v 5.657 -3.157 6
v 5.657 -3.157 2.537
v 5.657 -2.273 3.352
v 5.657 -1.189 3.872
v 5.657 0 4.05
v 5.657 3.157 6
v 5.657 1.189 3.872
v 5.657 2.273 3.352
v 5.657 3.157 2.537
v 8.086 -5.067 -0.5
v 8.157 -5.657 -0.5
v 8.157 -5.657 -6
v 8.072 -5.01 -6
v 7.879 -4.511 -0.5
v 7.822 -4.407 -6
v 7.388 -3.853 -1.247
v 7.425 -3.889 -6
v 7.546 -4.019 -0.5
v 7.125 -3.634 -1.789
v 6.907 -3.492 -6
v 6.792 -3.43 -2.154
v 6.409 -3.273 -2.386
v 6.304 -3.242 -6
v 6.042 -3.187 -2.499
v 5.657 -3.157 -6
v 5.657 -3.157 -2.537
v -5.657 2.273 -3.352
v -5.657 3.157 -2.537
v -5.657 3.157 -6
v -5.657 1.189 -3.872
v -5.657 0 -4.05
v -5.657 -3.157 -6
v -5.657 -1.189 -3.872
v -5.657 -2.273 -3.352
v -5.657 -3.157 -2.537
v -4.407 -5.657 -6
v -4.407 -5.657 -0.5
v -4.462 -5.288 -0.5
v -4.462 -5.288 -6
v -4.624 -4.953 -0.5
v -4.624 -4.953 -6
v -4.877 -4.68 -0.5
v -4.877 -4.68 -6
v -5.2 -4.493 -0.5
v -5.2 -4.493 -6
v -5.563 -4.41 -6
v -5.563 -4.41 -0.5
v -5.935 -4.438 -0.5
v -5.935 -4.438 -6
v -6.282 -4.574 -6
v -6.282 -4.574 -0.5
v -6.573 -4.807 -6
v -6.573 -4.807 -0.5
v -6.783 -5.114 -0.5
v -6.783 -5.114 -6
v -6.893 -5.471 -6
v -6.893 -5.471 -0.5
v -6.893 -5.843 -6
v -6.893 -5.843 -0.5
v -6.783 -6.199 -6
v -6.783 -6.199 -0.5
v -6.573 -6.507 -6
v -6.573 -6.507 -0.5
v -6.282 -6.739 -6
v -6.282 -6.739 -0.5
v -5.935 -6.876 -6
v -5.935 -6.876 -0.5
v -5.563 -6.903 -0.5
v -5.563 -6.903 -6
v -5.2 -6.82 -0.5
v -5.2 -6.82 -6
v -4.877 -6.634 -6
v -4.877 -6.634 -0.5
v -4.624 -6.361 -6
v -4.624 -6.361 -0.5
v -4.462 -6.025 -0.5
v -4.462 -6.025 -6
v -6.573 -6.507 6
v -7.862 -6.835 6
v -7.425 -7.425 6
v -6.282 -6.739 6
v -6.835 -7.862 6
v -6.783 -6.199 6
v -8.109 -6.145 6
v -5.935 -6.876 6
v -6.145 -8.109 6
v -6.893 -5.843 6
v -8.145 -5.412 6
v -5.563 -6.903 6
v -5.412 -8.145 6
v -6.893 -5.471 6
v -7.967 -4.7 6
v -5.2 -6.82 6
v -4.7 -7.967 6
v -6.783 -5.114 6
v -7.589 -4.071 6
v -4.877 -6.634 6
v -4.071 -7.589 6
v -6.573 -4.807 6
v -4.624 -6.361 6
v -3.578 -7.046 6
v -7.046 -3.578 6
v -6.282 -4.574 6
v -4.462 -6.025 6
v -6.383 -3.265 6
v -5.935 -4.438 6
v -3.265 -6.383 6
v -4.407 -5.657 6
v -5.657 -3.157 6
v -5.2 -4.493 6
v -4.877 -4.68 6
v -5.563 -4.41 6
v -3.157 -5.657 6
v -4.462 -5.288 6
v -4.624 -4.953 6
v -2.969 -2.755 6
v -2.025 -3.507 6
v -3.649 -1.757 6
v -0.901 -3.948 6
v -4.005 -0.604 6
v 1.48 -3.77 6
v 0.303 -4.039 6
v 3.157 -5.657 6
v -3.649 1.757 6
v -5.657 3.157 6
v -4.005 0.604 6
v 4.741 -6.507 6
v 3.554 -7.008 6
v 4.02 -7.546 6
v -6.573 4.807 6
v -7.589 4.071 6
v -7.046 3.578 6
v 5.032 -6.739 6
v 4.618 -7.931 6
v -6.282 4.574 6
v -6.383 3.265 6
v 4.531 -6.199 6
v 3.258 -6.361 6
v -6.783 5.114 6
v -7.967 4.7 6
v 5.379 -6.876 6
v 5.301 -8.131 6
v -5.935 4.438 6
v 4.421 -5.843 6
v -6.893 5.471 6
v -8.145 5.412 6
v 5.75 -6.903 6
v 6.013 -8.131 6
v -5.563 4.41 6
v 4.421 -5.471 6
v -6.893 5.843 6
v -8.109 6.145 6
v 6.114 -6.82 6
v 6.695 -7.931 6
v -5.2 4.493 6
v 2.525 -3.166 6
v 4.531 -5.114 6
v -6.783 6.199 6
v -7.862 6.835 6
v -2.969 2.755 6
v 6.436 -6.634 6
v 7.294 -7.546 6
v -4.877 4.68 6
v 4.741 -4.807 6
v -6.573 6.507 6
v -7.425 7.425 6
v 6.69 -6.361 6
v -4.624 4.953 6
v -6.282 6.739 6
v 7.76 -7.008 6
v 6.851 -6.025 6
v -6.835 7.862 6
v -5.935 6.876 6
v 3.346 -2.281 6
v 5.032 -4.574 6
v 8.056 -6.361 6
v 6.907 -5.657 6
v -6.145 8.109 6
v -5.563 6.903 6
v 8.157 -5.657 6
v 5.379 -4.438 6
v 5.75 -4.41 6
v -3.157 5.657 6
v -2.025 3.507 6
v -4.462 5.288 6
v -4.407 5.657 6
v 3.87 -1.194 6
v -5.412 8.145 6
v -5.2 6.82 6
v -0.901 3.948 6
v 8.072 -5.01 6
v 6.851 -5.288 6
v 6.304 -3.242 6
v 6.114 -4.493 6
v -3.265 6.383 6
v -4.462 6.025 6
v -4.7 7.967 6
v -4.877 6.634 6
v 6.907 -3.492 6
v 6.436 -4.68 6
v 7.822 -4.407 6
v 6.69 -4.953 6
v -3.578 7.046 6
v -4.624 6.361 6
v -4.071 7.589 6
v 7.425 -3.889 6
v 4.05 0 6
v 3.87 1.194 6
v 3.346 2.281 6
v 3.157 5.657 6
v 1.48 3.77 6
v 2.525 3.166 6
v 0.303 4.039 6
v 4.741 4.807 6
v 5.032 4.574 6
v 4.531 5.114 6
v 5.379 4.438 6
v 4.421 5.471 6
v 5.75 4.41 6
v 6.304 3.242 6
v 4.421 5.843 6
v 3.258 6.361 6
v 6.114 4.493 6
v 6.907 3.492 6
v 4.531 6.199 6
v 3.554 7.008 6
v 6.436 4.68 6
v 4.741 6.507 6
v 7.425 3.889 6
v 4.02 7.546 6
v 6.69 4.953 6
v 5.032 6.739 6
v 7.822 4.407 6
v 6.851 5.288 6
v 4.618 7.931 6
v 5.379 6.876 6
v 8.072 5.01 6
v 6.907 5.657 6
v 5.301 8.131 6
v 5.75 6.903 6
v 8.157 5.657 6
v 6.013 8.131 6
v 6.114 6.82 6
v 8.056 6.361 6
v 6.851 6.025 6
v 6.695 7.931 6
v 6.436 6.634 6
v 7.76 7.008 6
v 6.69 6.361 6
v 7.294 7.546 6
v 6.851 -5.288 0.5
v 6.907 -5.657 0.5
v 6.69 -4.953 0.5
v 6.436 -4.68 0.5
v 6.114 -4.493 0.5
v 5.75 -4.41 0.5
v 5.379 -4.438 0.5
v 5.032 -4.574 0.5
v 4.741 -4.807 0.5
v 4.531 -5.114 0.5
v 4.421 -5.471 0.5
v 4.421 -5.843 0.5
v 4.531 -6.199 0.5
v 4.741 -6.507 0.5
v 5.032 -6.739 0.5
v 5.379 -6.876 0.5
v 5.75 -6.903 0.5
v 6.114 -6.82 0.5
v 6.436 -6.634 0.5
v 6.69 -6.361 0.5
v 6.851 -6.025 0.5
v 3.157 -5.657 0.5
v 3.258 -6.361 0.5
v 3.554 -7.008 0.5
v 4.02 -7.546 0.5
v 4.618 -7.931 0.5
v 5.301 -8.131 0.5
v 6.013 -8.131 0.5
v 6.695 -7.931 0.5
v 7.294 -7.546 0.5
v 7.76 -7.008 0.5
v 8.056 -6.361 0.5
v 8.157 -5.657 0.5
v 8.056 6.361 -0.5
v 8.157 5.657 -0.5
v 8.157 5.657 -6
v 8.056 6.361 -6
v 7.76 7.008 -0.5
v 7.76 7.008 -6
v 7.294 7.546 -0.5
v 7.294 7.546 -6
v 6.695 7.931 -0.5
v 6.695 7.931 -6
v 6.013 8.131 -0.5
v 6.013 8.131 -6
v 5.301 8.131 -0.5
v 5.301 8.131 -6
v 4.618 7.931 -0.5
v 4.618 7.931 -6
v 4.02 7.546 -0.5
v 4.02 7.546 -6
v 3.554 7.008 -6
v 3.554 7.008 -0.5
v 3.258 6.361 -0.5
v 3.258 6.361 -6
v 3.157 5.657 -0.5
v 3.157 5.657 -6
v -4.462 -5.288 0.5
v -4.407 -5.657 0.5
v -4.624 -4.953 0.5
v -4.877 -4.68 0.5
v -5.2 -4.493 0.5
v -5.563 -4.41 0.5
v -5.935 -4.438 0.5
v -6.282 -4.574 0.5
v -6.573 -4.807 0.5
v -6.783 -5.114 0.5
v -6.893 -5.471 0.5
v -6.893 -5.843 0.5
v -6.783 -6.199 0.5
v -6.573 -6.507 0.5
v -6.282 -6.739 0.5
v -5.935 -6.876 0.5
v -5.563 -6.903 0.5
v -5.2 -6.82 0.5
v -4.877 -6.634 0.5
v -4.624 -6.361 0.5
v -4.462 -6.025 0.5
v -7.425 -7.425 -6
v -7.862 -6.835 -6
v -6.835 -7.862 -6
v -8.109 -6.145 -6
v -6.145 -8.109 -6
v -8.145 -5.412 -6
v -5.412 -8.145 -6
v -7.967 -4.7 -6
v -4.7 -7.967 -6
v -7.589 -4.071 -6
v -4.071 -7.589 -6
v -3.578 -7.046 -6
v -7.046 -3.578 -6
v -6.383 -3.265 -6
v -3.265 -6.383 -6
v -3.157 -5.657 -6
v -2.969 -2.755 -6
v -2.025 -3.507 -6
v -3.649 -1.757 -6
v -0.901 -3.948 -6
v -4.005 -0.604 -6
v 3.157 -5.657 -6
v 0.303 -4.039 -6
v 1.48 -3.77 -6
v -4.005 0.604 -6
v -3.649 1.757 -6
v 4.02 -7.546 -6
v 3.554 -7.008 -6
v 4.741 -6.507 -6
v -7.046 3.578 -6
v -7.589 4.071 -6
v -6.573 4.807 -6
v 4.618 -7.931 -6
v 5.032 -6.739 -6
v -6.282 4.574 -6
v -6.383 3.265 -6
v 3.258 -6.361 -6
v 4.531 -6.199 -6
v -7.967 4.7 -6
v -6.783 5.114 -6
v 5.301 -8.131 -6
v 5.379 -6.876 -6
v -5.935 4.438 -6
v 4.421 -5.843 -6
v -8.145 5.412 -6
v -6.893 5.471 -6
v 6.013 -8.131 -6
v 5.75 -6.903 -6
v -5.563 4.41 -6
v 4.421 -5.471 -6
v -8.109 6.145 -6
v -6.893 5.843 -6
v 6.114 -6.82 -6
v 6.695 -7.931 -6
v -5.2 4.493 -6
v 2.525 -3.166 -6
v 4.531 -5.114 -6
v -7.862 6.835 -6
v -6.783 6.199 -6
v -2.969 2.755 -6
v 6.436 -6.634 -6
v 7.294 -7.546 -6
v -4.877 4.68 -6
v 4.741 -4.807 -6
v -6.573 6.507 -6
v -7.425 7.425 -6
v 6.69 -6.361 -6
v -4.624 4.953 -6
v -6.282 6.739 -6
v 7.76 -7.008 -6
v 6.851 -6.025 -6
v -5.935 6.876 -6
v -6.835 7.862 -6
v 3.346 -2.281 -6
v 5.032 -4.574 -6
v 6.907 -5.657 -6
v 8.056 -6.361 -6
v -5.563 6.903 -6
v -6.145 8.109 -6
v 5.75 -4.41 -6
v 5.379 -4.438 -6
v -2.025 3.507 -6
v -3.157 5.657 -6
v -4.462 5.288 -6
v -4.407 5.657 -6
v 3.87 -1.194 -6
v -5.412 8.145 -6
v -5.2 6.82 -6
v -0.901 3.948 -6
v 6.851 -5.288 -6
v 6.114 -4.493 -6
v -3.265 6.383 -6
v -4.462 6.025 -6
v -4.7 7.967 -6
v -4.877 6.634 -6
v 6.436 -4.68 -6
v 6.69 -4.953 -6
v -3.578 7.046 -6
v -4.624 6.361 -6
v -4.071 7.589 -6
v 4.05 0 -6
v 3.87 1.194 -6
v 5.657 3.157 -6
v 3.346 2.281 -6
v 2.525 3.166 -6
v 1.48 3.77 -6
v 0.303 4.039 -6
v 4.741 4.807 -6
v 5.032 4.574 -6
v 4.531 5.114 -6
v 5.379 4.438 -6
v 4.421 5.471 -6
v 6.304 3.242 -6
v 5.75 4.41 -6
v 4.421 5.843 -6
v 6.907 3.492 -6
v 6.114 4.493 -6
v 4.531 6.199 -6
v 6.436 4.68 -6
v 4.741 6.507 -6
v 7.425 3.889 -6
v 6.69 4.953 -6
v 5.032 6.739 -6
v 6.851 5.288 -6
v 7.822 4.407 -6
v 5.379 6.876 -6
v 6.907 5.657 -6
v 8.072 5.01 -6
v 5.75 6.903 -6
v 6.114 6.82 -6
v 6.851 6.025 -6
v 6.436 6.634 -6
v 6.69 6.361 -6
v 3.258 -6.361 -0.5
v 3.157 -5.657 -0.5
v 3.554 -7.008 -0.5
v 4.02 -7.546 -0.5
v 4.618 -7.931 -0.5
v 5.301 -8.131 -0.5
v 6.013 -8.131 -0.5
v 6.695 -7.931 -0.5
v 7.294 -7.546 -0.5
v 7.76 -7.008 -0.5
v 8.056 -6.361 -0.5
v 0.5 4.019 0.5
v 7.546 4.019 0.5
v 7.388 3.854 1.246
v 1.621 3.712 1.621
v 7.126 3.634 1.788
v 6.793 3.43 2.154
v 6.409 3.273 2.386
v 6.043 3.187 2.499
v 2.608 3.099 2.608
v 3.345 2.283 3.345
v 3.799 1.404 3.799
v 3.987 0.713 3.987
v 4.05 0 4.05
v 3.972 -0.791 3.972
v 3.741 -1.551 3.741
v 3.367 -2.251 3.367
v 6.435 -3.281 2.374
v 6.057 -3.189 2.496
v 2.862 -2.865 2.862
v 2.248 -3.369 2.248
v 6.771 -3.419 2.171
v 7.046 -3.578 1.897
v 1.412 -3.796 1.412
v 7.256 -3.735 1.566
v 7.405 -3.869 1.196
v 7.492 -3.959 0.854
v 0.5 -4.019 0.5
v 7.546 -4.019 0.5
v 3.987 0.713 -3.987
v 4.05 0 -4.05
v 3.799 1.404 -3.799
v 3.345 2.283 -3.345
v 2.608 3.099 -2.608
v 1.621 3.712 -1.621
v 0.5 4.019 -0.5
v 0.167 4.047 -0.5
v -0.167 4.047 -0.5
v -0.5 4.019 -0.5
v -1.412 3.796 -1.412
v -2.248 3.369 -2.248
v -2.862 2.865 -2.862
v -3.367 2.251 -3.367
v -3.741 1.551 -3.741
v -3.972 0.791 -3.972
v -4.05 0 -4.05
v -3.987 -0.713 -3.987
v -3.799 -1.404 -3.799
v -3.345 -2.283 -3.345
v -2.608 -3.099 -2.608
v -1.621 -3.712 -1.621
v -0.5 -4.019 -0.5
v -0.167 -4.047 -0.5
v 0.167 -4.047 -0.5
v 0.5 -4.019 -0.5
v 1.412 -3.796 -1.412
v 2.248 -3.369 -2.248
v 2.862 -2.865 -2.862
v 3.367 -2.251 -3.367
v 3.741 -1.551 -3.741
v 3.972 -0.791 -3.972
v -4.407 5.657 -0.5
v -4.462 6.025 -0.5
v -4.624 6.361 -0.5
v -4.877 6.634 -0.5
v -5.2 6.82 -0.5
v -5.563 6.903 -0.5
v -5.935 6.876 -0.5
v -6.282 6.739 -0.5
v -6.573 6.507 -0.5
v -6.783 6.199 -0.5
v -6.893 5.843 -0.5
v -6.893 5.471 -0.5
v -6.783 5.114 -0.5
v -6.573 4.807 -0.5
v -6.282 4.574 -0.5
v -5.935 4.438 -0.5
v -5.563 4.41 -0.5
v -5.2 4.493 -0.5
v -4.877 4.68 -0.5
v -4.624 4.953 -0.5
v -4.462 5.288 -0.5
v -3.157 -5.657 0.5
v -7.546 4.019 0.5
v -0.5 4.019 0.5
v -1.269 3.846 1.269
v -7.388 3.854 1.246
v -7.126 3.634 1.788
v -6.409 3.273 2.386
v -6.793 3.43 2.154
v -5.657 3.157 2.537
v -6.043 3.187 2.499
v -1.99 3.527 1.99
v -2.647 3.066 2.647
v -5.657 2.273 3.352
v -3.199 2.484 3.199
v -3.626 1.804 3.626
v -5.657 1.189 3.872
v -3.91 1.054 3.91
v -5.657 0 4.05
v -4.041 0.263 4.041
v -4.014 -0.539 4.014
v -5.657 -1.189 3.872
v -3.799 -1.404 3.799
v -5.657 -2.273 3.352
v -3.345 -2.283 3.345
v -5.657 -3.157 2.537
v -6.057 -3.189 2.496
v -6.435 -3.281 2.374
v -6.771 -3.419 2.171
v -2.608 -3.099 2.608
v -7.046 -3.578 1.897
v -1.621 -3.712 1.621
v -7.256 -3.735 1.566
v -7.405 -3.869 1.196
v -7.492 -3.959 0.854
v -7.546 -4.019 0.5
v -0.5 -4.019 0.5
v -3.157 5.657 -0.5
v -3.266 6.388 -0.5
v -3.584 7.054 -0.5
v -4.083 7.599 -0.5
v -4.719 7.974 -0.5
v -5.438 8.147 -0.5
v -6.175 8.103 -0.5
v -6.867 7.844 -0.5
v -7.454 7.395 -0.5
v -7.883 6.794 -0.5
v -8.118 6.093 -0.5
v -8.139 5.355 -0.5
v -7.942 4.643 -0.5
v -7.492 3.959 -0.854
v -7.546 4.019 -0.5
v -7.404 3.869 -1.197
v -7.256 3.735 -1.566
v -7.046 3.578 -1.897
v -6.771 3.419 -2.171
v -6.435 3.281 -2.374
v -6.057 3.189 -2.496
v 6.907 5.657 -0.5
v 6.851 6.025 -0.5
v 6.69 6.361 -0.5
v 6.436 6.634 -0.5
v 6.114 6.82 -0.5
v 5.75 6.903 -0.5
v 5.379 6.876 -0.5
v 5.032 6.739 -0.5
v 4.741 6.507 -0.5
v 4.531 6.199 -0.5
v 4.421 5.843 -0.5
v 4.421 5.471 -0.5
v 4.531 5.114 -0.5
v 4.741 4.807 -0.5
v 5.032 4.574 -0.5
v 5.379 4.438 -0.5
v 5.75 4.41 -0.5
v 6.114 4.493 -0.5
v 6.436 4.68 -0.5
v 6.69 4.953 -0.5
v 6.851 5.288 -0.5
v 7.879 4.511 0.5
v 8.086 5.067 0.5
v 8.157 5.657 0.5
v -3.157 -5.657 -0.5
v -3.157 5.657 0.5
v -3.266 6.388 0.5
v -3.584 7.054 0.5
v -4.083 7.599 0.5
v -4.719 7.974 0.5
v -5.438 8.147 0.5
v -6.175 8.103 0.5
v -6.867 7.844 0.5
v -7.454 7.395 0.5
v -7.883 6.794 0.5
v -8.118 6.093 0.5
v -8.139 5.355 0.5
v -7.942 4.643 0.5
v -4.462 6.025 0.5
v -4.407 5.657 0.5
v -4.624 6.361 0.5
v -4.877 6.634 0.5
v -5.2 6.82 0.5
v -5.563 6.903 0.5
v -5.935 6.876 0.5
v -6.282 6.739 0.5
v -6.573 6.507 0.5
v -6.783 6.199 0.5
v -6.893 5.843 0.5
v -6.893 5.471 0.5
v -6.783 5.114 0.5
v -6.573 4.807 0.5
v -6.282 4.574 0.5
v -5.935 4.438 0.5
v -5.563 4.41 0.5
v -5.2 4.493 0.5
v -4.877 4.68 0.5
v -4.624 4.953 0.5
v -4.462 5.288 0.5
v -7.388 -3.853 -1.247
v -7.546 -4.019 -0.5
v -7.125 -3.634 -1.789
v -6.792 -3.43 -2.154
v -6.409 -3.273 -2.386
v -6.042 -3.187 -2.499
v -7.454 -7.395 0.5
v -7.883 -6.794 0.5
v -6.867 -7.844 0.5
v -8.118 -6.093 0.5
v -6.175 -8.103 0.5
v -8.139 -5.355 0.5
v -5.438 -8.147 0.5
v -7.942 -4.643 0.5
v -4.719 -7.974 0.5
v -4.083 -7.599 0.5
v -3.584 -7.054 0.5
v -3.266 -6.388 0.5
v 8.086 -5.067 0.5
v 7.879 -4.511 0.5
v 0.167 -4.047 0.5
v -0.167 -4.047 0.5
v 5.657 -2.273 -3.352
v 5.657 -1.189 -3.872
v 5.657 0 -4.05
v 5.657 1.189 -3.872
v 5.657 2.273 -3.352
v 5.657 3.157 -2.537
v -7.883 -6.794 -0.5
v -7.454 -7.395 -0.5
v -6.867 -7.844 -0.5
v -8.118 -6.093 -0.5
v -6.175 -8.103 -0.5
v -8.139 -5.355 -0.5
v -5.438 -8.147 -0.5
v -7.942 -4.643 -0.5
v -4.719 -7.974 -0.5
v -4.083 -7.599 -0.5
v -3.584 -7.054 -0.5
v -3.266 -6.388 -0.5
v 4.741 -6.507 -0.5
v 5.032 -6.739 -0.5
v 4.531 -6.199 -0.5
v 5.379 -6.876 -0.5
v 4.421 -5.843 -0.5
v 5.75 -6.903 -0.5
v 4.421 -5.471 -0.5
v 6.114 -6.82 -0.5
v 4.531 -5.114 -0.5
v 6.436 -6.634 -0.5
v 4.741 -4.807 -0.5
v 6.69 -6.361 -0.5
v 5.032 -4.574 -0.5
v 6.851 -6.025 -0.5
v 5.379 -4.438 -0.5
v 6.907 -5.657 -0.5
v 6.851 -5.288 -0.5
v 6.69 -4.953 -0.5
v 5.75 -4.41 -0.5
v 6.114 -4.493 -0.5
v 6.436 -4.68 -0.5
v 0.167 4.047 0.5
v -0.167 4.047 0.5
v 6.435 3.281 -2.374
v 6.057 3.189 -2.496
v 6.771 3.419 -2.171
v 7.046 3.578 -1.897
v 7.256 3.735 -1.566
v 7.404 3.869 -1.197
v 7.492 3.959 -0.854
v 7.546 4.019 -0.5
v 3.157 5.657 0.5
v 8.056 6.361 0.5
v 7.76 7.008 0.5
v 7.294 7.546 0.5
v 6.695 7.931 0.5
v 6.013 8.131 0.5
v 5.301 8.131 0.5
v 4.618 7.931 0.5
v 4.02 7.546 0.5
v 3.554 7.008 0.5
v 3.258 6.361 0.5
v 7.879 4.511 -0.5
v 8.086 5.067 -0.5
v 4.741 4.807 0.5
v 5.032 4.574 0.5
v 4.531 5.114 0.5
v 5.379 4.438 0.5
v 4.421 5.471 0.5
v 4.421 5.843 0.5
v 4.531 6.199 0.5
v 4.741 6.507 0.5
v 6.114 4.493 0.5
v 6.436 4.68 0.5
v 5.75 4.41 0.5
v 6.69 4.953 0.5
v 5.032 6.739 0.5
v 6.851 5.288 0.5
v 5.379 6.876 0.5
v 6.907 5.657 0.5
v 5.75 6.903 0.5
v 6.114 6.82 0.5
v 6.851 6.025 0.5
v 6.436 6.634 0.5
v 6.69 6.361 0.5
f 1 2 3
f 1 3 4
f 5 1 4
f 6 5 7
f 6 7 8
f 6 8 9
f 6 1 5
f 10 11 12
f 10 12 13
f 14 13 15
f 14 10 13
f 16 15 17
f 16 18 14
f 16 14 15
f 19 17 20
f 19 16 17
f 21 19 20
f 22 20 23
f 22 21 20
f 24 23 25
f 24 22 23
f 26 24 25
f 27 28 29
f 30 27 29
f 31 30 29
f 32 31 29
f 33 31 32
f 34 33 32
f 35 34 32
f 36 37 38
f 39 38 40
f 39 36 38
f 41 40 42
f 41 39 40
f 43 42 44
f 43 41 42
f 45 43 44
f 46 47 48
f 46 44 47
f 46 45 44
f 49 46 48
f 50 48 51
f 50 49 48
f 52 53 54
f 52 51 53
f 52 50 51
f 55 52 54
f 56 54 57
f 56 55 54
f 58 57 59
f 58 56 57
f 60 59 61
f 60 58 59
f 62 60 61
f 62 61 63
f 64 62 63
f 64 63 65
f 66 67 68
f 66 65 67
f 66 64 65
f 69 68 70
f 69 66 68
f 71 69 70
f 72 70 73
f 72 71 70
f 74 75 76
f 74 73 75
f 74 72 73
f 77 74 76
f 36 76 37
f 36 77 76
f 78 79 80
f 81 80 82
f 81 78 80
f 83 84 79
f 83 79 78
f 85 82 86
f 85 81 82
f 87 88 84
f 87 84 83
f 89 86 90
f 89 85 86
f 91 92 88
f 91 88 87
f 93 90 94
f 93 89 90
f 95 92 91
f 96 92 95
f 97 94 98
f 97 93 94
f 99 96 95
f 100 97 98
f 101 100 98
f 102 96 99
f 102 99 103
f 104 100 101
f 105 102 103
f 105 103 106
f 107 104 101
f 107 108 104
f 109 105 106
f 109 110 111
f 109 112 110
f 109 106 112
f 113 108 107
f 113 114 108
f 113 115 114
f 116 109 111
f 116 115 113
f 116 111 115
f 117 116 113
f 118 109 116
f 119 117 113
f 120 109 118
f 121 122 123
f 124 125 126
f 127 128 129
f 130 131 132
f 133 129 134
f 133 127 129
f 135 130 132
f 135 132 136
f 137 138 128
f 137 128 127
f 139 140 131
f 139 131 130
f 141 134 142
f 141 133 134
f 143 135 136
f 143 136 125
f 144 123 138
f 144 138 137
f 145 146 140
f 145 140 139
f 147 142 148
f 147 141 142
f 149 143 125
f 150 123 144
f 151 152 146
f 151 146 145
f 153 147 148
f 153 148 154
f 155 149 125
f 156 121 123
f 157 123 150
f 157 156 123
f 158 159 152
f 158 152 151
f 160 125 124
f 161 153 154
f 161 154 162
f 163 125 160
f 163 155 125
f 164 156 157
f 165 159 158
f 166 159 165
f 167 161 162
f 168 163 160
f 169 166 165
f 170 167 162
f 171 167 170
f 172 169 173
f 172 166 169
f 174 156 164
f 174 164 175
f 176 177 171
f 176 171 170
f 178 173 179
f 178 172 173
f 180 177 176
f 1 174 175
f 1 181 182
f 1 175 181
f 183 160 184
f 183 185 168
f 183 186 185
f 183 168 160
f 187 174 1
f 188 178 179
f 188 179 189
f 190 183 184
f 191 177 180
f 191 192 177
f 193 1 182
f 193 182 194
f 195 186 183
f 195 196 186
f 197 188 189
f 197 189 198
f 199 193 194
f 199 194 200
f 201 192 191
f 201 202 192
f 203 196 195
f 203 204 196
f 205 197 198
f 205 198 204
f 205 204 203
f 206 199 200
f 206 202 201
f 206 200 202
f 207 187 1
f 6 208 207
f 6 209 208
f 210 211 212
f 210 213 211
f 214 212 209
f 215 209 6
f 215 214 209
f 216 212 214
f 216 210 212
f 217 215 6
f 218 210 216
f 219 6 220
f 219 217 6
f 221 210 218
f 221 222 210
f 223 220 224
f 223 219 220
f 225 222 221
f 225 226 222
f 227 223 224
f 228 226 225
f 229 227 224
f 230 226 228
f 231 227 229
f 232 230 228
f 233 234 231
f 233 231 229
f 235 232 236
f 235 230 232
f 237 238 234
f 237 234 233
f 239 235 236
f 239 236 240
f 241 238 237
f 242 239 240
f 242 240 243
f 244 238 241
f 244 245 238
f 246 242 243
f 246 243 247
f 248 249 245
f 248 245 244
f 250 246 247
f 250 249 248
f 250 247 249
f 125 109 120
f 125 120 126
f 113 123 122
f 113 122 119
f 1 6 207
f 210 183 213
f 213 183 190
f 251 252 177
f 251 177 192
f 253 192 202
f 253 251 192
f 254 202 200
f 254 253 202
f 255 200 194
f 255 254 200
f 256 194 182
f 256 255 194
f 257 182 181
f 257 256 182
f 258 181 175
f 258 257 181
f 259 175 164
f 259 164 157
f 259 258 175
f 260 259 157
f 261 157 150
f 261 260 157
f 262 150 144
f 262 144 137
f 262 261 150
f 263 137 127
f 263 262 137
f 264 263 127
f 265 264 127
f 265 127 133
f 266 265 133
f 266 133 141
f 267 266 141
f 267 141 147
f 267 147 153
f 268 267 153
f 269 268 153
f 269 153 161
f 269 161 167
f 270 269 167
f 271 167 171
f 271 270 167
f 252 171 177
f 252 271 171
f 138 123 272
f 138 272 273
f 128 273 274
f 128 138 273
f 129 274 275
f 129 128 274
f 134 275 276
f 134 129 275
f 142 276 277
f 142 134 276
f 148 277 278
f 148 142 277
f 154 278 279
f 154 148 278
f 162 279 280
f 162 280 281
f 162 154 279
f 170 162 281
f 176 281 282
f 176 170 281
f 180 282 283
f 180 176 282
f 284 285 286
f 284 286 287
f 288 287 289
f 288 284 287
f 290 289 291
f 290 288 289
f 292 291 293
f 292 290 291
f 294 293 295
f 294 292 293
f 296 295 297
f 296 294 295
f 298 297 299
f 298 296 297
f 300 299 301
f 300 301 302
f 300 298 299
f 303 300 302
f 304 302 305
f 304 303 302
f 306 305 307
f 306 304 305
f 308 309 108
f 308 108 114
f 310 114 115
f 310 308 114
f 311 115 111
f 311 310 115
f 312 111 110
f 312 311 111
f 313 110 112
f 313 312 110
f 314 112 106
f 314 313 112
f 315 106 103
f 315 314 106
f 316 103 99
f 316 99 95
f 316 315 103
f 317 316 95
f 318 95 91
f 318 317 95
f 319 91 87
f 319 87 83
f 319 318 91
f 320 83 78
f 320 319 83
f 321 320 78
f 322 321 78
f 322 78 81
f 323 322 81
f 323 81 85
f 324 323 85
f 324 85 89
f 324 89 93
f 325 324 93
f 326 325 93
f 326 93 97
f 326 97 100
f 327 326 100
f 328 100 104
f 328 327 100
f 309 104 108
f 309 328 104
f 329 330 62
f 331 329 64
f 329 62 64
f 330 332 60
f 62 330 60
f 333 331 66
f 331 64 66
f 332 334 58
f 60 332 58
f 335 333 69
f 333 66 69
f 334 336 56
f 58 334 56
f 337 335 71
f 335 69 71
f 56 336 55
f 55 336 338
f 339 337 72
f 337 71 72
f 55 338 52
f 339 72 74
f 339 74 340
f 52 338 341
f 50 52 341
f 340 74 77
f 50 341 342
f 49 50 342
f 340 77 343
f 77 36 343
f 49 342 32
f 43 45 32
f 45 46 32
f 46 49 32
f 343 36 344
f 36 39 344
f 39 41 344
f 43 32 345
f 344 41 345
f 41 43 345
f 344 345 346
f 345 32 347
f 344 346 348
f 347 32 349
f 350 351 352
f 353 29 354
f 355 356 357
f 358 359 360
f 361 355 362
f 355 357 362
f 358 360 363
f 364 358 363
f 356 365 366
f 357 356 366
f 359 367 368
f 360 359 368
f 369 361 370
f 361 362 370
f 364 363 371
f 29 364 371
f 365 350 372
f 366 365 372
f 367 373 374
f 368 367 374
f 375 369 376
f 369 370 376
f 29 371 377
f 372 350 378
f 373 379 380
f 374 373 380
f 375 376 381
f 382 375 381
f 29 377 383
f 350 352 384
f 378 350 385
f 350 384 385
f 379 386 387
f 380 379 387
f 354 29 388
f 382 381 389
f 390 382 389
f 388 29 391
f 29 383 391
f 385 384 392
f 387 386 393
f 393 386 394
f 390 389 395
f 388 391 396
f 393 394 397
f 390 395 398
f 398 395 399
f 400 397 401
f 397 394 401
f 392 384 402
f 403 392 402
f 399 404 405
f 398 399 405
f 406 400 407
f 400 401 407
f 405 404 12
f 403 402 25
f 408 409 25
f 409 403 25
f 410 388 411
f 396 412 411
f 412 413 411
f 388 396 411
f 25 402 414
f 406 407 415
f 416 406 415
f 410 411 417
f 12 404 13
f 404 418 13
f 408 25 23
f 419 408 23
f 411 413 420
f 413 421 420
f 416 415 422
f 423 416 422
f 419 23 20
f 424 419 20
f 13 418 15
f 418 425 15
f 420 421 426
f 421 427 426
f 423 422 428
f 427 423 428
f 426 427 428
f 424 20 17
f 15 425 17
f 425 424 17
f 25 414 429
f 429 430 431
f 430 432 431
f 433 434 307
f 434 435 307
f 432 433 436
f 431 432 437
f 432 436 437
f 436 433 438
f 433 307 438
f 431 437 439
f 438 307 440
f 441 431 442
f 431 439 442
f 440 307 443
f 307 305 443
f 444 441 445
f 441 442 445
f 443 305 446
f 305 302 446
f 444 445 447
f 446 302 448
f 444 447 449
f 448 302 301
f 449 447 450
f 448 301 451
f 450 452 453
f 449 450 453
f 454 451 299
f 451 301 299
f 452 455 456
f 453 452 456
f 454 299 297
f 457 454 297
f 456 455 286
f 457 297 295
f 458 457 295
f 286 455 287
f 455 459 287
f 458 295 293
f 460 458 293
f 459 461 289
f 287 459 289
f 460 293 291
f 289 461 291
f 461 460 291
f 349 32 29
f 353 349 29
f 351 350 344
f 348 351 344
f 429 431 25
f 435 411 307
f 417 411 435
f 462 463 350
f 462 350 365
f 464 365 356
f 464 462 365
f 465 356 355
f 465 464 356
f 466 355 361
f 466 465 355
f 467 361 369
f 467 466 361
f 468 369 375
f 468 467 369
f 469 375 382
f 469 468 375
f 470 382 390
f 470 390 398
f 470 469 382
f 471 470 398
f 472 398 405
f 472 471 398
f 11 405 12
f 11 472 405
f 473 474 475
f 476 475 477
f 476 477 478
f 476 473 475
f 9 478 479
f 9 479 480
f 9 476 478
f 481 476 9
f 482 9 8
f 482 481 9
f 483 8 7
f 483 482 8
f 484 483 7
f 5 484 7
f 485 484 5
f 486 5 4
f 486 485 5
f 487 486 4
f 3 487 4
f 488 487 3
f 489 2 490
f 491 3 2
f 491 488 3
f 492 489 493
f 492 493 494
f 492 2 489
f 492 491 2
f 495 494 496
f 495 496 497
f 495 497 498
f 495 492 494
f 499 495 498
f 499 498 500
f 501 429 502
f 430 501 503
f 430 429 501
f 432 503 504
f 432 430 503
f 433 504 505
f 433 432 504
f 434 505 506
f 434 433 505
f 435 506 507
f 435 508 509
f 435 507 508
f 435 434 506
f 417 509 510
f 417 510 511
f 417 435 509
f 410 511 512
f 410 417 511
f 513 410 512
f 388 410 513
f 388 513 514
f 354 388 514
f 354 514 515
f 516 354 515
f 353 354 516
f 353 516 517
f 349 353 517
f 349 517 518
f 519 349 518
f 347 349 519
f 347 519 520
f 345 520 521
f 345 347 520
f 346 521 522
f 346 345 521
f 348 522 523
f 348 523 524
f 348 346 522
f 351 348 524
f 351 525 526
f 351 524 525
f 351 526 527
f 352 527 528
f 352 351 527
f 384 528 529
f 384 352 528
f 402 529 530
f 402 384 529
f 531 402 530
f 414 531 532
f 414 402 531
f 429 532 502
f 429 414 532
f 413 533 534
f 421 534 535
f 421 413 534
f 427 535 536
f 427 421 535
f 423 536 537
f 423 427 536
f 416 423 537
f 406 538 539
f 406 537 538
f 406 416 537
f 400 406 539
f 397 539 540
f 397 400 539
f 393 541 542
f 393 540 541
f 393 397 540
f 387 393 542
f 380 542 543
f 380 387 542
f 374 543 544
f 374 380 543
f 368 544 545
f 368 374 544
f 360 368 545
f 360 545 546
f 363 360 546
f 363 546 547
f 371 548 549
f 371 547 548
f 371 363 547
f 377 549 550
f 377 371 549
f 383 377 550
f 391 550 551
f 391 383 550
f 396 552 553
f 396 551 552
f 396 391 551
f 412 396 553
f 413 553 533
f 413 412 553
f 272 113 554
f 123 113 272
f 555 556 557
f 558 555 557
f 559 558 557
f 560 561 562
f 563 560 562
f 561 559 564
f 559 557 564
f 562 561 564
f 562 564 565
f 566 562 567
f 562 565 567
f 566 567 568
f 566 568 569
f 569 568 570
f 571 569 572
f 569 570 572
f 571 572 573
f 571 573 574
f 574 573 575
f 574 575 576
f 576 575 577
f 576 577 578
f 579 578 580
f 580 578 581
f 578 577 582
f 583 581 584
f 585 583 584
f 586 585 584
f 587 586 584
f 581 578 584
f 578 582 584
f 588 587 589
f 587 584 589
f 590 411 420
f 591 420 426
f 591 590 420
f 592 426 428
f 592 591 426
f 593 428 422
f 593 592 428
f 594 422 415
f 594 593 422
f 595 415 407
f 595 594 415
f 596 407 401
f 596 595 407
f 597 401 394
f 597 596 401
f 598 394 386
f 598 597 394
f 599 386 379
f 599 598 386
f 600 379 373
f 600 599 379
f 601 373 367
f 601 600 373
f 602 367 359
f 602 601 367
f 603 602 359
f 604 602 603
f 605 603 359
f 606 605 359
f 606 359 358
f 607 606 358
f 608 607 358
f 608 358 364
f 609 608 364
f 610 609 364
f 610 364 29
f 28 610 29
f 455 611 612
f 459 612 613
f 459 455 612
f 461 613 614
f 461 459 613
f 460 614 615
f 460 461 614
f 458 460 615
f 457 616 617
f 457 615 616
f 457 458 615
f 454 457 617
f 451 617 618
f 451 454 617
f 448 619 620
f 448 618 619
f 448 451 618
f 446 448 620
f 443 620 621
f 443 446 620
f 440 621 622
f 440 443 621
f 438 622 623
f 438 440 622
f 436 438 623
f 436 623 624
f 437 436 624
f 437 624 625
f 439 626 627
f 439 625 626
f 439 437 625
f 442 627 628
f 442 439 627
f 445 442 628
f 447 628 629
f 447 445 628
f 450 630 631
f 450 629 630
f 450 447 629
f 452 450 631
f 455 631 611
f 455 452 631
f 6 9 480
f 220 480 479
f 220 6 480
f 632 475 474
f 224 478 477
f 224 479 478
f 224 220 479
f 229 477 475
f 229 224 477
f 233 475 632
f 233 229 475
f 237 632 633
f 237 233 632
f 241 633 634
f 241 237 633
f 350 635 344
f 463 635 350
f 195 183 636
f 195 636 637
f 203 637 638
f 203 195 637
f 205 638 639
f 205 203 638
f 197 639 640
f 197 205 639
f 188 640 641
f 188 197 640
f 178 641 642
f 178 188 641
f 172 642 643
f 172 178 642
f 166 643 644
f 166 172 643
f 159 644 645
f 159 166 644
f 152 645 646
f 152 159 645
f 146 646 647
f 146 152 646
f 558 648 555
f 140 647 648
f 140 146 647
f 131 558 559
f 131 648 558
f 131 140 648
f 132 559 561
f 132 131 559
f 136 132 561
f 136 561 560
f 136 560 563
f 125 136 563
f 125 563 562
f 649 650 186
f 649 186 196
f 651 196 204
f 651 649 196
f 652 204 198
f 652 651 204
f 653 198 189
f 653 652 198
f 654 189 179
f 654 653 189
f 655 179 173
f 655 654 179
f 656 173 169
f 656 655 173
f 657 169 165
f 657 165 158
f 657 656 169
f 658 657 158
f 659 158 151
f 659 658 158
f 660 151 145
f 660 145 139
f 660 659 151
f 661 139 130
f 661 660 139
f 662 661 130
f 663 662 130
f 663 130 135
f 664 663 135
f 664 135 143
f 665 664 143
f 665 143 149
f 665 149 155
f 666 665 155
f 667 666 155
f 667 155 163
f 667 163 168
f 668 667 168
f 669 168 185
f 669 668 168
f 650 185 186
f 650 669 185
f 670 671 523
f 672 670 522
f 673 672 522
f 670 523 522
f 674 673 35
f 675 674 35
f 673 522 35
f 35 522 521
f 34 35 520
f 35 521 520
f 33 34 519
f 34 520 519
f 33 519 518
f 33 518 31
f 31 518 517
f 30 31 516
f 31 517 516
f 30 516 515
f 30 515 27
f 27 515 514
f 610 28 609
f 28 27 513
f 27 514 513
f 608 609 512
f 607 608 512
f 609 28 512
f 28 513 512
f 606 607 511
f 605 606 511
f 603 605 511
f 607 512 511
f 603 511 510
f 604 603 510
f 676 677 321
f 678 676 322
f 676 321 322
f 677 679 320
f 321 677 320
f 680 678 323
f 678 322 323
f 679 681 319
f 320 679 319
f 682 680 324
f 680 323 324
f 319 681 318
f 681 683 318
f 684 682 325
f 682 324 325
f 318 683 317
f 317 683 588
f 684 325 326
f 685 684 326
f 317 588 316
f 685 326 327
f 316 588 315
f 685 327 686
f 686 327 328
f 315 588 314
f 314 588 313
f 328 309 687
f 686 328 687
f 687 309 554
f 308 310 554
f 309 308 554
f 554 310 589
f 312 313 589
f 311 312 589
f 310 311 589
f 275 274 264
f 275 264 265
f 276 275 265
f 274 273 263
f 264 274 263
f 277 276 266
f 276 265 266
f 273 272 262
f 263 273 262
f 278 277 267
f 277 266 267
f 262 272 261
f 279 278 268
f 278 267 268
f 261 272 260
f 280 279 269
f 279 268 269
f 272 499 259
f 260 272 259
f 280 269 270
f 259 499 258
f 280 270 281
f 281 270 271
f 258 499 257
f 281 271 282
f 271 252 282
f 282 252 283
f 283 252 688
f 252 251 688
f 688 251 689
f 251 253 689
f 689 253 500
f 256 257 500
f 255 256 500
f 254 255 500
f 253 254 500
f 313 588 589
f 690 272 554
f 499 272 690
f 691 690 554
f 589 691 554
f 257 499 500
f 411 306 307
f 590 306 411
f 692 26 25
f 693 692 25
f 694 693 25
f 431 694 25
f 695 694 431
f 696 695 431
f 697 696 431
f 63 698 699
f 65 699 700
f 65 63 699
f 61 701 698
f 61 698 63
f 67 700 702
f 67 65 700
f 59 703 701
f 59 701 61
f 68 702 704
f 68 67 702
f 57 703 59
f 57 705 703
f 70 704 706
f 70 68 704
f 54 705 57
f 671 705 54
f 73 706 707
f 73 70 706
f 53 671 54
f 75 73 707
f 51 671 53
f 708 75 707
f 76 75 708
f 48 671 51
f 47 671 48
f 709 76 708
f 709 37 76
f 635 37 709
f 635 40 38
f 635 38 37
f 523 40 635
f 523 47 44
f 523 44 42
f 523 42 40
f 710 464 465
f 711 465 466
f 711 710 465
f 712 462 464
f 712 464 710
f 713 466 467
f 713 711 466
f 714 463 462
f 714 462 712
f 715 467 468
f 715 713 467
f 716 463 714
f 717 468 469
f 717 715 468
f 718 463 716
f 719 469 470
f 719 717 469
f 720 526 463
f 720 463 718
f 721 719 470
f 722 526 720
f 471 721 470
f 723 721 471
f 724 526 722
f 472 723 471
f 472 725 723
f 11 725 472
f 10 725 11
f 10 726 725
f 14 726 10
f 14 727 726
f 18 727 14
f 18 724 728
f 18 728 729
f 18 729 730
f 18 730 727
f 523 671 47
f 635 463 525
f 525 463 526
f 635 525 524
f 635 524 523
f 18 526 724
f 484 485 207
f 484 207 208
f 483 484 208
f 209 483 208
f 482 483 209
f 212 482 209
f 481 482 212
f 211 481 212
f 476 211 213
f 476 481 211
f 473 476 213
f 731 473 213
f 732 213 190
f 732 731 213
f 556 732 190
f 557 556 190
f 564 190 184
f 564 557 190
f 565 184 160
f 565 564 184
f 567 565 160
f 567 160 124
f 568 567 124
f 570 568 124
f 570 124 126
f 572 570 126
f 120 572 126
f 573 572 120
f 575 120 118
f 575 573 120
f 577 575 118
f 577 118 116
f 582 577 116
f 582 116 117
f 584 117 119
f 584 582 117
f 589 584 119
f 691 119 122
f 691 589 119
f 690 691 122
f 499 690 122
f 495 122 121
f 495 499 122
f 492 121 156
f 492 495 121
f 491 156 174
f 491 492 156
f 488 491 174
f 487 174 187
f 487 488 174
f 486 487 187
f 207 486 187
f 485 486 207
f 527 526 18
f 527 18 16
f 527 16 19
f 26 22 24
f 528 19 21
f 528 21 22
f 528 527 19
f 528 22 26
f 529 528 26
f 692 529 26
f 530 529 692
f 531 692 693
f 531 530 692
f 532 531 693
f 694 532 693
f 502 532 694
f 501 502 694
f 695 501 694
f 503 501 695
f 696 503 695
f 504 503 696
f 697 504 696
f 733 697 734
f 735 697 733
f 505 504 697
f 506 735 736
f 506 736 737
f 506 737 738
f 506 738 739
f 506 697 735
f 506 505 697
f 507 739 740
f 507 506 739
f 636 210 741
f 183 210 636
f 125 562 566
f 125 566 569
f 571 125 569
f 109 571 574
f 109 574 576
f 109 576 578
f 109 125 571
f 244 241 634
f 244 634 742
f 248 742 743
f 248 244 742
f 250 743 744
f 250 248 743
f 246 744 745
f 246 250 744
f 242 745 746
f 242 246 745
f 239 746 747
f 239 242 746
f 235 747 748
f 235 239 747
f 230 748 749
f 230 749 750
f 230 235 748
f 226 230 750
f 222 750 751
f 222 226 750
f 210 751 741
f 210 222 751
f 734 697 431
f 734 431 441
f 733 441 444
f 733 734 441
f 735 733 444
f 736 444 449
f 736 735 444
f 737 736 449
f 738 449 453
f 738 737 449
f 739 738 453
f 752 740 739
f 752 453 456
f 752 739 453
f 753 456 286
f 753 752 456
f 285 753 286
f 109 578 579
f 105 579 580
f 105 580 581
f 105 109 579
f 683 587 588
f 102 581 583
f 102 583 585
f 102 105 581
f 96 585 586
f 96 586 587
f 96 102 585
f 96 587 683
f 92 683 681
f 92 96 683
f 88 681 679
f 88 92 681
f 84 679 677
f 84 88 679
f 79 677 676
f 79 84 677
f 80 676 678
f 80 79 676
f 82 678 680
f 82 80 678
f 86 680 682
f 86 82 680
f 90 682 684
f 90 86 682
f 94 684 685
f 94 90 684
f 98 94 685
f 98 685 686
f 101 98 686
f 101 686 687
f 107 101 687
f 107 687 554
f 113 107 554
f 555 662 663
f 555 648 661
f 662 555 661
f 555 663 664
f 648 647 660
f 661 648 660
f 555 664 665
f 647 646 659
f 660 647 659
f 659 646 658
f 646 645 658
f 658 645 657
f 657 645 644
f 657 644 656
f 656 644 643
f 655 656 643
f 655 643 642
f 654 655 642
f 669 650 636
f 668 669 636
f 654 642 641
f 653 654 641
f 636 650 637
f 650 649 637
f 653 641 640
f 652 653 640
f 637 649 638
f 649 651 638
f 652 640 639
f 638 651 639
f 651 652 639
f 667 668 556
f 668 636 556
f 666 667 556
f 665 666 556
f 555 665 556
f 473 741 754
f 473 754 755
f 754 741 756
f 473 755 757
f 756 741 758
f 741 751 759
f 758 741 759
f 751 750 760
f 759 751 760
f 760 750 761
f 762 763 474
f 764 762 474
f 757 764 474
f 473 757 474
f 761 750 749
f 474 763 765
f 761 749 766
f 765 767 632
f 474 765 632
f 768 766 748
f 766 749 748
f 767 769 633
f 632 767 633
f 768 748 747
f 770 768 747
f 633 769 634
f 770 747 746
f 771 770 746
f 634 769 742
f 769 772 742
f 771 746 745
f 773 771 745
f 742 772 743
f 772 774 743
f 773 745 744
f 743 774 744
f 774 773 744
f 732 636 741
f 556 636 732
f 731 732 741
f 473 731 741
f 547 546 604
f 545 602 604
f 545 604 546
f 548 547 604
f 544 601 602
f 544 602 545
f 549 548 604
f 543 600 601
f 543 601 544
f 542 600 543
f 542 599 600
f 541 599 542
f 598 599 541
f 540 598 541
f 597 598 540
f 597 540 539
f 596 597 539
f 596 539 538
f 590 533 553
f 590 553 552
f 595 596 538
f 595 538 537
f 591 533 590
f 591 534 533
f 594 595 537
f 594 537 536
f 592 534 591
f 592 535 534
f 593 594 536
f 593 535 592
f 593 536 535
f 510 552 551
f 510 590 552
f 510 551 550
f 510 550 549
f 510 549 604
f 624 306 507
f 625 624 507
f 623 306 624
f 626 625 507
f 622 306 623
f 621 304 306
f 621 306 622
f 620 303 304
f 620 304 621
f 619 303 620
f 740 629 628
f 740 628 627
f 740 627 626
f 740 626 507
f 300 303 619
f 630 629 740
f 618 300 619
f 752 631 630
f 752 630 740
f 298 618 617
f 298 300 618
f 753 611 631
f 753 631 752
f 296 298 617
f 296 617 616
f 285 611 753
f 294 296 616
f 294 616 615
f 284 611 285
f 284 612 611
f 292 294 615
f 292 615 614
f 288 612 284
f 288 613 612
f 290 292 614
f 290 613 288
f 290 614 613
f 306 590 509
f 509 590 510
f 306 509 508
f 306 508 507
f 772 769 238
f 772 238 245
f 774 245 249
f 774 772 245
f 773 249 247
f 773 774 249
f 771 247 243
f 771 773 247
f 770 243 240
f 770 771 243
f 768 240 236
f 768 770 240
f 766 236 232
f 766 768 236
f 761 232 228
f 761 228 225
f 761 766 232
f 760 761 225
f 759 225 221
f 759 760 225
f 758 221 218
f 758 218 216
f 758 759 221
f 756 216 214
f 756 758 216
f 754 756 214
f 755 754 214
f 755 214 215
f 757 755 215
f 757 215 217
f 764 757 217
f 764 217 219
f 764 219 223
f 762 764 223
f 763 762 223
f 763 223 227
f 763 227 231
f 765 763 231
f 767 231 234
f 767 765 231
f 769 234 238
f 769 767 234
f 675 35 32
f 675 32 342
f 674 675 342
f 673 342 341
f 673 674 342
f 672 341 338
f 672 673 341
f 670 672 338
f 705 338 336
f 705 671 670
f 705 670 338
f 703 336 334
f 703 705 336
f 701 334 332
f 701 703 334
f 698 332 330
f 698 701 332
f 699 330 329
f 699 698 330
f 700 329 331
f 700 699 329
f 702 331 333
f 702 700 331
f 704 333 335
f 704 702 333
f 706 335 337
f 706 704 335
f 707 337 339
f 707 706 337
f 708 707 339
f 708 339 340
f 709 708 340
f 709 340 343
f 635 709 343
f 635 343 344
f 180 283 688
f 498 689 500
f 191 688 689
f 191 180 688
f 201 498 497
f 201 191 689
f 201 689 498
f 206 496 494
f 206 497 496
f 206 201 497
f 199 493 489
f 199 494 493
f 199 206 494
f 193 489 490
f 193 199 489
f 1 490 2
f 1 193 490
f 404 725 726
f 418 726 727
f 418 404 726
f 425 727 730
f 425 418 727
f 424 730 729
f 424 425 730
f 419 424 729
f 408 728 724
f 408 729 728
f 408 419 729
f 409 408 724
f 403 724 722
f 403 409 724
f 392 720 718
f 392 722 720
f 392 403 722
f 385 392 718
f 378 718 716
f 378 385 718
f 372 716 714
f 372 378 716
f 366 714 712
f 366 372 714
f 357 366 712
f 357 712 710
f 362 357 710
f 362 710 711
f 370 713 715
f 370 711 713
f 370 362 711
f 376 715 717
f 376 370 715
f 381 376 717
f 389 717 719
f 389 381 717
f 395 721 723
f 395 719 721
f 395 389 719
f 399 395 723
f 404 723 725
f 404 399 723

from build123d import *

# Parameters (mm, degrees)
F0_R          = 1.25
F0_R_2        = 4.05
F1_DEPTH      = 6
F2_R          = 4.05
F3_DEPTH      = 8.157854
F3_DEPTH_BACK = 8.157854
F4_W          = 27.181234
F4_H          = 24.001454
F5_DEPTH      = 0.5


with BuildPart() as f1:
    # F0 (on Top) → F1 (new body, symmetric)
    with BuildSketch(Plane.XY):
        with BuildLine():
            ThreePointArc((-5.656854, 3.156854), (-3.889087, 3.889087), (-3.156854, 5.656854))
            ThreePointArc((-3.156854, 5.656854), (-7.424621, 7.424621), (-5.656854, 3.156854))
        make_face()
        with Locations((-5.656854, 5.656854)):
            Circle(F0_R, mode=Mode.SUBTRACT)
        with BuildLine():
            Line((3.156854, 5.656854), (-3.156854, 5.656854))
            ThreePointArc((-3.156854, 5.656854), (-3.889087, 3.889087), (-5.656854, 3.156854))
            Line((-5.656854, 3.156854), (-5.656854, -3.156854))
            ThreePointArc((-5.656854, -3.156854), (-3.889087, -3.889087), (-3.156854, -5.656854))
            Line((-3.156854, -5.656854), (3.156854, -5.656854))
            ThreePointArc((3.156854, -5.656854), (3.889087, -3.889087), (5.656854, -3.156854))
            Line((5.656854, -3.156854), (5.656854, 3.156854))
            ThreePointArc((5.656854, 3.156854), (3.889087, 3.889087), (3.156854, 5.656854))
        make_face()
        Circle(F0_R_2, mode=Mode.SUBTRACT)
        with BuildLine():
            ThreePointArc((8.156854, 5.656854), (5.656854, 8.156854), (3.156854, 5.656854))
            ThreePointArc((3.156854, 5.656854), (3.889087, 3.889087), (5.656854, 3.156854))
            ThreePointArc((5.656854, 3.156854), (7.424621, 3.889087), (8.156854, 5.656854))
        make_face()
        with Locations((5.656854, 5.656854)):
            Circle(F0_R, mode=Mode.SUBTRACT)
        with BuildLine():
            ThreePointArc((-3.156854, -5.656854), (-3.889087, -3.889087), (-5.656854, -3.156854))
            ThreePointArc((-5.656854, -3.156854), (-7.424621, -7.424621), (-3.156854, -5.656854))
        make_face()
        with Locations((-5.656854, -5.656854)):
            Circle(F0_R, mode=Mode.SUBTRACT)
        with BuildLine():
            ThreePointArc((8.156854, -5.656854), (7.424621, -3.889087), (5.656854, -3.156854))
            ThreePointArc((5.656854, -3.156854), (3.889087, -3.889087), (3.156854, -5.656854))
            ThreePointArc((3.156854, -5.656854), (5.656854, -8.156854), (8.156854, -5.656854))
        make_face()
        with Locations((5.656854, -5.656854)):
            Circle(F0_R, mode=Mode.SUBTRACT)
    extrude(amount=F1_DEPTH, both=True)

    # F2 (on Right) → F3 (cut, two sides)
    with BuildSketch(Plane.YZ) as f3_sk:
        Circle(F2_R)
    extrude(amount=F3_DEPTH, mode=Mode.SUBTRACT)
    extrude(f3_sk.sketch, amount=-F3_DEPTH_BACK, mode=Mode.SUBTRACT)

    # F4 (on Top) → F5 (cut, symmetric)
    with BuildSketch(Plane.XY):
        Rectangle(F4_W, F4_H)
    extrude(amount=F5_DEPTH, both=True, mode=Mode.SUBTRACT)


solid = f1.part
